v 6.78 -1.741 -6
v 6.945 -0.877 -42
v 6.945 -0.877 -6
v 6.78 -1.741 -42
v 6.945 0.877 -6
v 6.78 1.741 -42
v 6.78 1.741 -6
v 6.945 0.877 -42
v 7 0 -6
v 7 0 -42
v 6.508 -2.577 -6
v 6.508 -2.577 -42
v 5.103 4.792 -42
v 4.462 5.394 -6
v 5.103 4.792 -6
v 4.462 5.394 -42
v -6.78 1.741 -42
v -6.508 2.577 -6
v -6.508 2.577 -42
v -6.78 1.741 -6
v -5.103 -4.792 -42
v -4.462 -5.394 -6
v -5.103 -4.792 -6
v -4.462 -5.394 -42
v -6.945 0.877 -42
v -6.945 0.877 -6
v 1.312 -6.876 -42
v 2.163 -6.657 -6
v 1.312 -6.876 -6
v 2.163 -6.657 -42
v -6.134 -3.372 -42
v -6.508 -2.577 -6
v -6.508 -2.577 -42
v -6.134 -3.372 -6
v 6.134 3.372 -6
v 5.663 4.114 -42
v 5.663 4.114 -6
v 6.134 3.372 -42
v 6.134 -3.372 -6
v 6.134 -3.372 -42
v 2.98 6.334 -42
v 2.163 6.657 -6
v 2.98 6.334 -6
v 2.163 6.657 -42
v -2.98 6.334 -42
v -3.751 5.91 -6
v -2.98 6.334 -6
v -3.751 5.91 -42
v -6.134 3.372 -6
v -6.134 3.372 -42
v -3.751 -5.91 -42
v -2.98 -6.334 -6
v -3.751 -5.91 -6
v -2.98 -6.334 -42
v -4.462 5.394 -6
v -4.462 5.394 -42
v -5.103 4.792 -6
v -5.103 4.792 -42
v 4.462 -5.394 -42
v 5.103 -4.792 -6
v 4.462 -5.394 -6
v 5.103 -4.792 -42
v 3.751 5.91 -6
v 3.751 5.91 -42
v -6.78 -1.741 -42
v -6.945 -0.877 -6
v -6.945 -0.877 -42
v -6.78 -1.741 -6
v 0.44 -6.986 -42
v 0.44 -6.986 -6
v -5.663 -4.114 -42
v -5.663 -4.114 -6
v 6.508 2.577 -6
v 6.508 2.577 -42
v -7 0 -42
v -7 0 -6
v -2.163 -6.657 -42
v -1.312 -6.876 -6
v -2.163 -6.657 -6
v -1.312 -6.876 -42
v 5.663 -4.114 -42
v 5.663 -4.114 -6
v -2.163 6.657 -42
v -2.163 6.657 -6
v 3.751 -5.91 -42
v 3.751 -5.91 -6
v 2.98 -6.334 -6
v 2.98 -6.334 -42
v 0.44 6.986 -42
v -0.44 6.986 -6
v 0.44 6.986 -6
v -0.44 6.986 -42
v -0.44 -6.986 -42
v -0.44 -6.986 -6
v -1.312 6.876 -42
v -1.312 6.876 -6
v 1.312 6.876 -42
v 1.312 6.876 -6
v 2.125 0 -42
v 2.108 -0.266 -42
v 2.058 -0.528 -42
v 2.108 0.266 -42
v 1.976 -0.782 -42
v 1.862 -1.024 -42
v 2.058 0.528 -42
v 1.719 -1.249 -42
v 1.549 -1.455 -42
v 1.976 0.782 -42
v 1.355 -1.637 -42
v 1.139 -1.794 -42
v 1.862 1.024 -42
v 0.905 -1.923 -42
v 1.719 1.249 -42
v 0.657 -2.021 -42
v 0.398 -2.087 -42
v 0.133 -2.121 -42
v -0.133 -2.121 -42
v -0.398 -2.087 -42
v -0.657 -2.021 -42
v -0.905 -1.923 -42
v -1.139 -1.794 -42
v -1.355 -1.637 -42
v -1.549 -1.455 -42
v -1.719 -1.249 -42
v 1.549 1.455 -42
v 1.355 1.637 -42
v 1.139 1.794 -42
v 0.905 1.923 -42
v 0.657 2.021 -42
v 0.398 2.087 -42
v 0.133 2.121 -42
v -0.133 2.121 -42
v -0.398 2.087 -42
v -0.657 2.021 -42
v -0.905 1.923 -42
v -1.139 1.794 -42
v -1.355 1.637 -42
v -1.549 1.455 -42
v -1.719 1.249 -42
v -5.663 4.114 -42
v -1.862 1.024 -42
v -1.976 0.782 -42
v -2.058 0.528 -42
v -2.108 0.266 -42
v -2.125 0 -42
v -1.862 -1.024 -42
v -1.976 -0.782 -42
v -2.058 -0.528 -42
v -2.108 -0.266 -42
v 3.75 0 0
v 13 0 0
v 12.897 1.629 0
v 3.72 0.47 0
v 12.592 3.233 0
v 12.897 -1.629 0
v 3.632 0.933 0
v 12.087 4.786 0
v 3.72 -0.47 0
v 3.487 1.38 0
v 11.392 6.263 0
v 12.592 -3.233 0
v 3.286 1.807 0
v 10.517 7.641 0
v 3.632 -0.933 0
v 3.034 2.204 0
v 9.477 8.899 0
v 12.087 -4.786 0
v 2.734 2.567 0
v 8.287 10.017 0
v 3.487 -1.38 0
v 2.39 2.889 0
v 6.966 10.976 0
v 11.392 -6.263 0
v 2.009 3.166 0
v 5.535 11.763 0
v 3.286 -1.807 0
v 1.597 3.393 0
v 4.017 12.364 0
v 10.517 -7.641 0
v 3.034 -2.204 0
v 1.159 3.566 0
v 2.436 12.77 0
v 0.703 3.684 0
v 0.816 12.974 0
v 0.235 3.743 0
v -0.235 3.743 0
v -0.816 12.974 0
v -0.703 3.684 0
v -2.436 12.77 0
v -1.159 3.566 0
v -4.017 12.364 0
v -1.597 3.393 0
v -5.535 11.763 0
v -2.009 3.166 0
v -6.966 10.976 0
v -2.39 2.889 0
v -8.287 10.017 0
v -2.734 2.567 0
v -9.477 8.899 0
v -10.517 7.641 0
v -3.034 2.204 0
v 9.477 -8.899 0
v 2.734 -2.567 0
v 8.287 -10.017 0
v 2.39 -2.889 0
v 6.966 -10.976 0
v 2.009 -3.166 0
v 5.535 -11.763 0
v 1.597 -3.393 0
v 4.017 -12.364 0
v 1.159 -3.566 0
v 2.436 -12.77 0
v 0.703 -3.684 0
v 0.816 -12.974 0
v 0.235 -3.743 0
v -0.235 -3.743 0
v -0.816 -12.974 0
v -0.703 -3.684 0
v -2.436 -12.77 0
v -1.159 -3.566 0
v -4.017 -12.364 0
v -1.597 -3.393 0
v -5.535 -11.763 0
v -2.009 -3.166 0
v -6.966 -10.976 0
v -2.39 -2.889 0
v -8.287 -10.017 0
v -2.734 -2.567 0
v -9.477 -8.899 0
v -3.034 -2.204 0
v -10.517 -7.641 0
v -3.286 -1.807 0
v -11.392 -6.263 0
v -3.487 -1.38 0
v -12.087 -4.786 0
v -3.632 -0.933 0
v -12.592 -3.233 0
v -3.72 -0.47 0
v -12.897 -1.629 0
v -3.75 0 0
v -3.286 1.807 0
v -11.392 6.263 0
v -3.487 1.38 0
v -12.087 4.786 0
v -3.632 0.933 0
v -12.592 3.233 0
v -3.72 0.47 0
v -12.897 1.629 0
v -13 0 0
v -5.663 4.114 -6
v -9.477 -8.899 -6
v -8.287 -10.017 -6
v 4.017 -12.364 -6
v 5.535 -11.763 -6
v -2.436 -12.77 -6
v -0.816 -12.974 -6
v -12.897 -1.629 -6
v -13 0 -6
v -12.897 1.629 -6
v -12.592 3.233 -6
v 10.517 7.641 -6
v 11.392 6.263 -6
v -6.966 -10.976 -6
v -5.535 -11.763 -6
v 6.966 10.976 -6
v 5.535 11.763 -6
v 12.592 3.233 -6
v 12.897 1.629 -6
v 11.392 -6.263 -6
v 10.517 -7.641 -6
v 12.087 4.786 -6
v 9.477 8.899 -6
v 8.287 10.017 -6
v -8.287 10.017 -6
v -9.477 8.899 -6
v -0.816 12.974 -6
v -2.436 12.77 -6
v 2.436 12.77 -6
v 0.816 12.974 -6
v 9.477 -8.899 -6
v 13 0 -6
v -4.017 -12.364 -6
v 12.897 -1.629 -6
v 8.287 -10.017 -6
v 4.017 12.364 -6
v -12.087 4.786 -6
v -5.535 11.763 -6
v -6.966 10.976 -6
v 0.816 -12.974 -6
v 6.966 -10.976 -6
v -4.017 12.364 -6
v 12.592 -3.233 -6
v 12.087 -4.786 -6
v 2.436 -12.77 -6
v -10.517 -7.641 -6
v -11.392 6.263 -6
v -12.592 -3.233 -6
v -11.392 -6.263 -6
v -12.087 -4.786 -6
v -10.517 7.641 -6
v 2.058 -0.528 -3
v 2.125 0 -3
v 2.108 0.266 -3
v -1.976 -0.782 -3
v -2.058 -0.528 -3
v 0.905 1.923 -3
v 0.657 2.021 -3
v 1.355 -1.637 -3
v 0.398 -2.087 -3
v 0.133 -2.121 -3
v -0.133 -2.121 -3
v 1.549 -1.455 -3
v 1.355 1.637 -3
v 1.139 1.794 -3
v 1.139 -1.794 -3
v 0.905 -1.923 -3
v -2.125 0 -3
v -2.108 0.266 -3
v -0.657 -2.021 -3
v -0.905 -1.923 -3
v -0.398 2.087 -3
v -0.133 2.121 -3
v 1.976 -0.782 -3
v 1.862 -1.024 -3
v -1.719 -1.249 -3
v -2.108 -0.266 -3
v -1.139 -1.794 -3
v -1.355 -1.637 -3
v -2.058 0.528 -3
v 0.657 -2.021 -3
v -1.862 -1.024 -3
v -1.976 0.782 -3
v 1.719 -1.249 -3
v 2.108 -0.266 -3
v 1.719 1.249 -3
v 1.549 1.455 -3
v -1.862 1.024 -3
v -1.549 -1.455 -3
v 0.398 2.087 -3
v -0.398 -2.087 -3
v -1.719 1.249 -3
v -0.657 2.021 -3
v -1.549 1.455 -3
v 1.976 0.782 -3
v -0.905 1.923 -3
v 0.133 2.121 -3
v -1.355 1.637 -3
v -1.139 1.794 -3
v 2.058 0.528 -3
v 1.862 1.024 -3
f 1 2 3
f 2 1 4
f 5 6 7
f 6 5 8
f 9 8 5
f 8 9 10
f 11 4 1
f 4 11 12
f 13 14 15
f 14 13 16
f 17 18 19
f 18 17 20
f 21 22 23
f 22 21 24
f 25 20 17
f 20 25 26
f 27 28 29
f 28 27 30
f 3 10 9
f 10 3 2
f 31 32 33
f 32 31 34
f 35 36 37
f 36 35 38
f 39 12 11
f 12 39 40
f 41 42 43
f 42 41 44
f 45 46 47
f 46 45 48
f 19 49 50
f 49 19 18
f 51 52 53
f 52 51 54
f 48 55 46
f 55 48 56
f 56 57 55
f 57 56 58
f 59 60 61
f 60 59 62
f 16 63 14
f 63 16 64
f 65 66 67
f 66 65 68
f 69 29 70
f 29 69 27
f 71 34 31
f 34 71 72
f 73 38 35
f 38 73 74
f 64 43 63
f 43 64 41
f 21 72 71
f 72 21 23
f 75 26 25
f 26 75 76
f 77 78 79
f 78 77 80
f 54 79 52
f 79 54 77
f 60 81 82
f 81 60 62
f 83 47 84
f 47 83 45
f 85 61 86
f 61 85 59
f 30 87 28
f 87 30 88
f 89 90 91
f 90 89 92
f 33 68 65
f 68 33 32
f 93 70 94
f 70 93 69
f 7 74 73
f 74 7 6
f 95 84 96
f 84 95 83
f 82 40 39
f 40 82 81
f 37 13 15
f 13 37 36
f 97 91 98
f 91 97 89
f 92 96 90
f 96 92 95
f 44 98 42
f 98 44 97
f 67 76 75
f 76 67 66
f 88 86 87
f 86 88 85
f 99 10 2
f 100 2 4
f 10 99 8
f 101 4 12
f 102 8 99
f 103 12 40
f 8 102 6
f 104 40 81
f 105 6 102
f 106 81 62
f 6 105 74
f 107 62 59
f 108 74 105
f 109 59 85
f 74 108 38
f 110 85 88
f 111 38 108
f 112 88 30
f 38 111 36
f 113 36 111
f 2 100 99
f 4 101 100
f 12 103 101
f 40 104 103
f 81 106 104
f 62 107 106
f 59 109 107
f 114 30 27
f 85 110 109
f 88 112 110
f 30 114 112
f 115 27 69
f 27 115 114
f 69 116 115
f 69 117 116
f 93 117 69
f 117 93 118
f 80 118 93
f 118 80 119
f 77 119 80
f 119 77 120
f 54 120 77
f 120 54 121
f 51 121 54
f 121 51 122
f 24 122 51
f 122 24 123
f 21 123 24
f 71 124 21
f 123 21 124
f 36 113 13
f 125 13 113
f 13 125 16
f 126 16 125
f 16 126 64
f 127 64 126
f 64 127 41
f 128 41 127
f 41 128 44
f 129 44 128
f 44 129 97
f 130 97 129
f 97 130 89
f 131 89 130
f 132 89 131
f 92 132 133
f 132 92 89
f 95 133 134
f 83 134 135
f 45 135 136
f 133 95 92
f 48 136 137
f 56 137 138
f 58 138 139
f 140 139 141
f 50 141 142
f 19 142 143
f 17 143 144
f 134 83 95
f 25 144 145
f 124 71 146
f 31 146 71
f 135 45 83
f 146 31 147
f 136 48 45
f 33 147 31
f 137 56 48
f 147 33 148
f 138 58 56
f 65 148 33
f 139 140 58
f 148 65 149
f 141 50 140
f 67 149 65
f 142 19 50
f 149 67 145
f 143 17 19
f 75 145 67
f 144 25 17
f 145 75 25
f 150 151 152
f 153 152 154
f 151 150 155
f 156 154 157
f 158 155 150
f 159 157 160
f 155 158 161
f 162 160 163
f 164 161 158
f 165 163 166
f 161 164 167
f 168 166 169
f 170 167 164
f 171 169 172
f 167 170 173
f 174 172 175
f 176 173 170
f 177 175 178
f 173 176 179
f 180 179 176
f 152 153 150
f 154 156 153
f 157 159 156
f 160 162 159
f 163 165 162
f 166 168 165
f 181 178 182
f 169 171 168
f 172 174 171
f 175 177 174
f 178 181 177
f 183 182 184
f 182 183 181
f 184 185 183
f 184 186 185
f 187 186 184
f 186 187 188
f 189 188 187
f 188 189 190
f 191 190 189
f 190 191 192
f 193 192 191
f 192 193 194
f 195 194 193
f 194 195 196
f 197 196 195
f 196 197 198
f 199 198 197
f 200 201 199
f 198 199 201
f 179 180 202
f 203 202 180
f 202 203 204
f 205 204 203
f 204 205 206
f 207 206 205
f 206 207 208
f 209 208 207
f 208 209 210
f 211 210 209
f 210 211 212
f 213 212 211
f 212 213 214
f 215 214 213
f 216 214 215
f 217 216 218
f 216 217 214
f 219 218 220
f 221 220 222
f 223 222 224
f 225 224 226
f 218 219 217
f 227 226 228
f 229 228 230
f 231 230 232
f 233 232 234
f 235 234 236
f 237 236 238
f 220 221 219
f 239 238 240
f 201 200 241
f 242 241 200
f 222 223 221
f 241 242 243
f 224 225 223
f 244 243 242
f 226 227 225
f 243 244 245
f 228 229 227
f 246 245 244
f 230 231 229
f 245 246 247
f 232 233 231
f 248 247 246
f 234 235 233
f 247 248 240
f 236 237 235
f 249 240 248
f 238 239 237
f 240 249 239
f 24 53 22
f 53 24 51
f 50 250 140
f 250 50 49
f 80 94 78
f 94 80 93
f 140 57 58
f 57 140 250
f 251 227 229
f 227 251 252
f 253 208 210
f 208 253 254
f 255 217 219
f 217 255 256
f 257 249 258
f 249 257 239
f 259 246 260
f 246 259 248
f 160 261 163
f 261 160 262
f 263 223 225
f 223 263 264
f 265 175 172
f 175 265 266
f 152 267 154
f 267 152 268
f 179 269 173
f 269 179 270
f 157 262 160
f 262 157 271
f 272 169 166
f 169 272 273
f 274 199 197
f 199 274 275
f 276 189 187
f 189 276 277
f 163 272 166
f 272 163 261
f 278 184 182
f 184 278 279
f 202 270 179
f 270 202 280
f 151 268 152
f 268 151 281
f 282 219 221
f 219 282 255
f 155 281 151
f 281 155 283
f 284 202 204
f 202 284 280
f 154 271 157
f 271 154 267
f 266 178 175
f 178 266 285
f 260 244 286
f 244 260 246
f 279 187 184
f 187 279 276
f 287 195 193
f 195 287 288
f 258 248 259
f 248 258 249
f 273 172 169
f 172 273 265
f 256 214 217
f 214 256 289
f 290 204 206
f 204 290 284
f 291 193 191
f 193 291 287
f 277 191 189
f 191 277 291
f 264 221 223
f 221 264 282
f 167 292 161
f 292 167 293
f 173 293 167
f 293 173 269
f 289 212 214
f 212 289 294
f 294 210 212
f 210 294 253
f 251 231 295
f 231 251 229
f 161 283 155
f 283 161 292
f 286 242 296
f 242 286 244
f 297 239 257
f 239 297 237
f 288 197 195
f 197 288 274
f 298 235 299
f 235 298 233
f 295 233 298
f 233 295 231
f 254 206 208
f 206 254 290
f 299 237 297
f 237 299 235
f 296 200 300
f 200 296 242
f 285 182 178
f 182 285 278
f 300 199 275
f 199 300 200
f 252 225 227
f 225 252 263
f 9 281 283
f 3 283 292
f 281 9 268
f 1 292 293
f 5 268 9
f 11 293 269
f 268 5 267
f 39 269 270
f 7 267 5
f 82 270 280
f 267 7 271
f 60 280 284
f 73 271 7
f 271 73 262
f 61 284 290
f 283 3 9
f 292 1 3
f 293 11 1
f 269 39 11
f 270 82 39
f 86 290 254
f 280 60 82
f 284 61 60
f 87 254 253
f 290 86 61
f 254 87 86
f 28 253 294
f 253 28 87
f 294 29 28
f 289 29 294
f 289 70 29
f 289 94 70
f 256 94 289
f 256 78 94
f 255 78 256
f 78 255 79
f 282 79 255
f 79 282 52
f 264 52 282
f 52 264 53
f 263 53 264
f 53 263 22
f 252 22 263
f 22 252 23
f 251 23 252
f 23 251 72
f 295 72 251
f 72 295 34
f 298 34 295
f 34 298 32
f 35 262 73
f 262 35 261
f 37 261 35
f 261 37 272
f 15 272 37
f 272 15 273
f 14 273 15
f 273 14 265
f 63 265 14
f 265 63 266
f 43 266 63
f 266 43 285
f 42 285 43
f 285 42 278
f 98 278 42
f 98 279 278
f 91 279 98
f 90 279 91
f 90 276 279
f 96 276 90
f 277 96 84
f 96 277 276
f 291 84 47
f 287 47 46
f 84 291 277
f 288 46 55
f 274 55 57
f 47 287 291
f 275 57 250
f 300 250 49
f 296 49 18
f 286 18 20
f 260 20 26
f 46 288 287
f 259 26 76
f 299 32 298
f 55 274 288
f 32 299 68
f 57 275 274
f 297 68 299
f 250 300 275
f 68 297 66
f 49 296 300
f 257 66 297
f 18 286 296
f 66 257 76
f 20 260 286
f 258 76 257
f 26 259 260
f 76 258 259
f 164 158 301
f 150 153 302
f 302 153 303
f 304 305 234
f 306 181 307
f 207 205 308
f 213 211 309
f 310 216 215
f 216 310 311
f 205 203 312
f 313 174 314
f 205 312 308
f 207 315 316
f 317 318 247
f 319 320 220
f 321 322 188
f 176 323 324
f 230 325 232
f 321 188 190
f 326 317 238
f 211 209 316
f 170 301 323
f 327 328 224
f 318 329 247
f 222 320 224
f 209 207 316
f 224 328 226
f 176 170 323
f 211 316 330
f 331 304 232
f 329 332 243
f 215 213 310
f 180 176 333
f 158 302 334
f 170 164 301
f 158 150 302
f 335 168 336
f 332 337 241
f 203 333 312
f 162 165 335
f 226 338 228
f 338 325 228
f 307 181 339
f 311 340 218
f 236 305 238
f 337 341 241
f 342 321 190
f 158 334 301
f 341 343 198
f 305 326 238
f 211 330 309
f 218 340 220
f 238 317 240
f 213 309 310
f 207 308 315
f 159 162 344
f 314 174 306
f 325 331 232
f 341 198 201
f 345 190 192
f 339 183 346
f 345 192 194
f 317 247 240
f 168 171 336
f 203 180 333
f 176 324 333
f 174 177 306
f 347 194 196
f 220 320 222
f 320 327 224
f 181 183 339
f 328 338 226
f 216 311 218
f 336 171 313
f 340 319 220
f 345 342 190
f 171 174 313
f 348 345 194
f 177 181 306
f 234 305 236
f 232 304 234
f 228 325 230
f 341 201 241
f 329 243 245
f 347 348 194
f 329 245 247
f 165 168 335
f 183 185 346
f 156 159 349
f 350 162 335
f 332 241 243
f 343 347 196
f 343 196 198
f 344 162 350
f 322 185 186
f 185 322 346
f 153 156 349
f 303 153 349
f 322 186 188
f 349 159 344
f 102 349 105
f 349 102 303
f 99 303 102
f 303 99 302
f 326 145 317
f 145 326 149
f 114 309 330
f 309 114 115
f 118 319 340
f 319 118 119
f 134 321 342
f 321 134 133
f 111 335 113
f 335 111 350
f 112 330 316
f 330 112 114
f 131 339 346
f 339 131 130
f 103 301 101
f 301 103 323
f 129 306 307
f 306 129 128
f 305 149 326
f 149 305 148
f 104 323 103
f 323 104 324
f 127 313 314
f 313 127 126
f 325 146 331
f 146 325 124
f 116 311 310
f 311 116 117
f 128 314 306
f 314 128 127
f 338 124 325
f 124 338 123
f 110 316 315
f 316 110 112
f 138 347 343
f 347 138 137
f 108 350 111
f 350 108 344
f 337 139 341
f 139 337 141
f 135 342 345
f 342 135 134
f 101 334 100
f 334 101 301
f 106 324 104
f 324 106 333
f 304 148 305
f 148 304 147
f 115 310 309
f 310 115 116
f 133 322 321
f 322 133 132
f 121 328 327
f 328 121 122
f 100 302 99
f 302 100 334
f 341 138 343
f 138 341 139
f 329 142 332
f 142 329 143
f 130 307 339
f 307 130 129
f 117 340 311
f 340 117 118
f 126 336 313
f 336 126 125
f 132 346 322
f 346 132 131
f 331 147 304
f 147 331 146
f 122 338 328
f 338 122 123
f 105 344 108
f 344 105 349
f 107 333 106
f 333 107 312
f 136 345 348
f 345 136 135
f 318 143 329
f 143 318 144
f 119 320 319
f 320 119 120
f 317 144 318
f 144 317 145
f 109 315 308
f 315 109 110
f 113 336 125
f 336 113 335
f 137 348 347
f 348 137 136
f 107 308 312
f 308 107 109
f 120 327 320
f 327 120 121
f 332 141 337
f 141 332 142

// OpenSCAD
$fn = 50;


difference() {
	union() {
		translate(v = [0, 0, -42.0000000000]) {
			cylinder(h = 42, r = 7.0000000000);
		}
		translate(v = [0, 0, -6.0000000000]) {
			cylinder(h = 6, r = 13.0000000000);
		}
	}
	union() {
		translate(v = [0, 0, 0]) {
			rotate(a = [0, 0, 0]) {
				difference() {
					union() {
						#translate(v = [0, 0, -42.0000000000]) {
							cylinder(h = 42, r = 2.0000000000);
						}
						#translate(v = [0, 0, -3]) {
							cylinder(h = 3, r = 7.0000000000, r1 = 2.1250000000, r2 = 3.7500000000);
						}
						#translate(v = [0, 0, -42.0000000000]) {
							cylinder(h = 42, r = 2.1250000000);
						}
						#translate(v = [0, 0, -42.0000000000]) {
							cylinder(h = 42, r = 2.0000000000);
						}
					}
					union();
				}
			}
		}
	}
}
